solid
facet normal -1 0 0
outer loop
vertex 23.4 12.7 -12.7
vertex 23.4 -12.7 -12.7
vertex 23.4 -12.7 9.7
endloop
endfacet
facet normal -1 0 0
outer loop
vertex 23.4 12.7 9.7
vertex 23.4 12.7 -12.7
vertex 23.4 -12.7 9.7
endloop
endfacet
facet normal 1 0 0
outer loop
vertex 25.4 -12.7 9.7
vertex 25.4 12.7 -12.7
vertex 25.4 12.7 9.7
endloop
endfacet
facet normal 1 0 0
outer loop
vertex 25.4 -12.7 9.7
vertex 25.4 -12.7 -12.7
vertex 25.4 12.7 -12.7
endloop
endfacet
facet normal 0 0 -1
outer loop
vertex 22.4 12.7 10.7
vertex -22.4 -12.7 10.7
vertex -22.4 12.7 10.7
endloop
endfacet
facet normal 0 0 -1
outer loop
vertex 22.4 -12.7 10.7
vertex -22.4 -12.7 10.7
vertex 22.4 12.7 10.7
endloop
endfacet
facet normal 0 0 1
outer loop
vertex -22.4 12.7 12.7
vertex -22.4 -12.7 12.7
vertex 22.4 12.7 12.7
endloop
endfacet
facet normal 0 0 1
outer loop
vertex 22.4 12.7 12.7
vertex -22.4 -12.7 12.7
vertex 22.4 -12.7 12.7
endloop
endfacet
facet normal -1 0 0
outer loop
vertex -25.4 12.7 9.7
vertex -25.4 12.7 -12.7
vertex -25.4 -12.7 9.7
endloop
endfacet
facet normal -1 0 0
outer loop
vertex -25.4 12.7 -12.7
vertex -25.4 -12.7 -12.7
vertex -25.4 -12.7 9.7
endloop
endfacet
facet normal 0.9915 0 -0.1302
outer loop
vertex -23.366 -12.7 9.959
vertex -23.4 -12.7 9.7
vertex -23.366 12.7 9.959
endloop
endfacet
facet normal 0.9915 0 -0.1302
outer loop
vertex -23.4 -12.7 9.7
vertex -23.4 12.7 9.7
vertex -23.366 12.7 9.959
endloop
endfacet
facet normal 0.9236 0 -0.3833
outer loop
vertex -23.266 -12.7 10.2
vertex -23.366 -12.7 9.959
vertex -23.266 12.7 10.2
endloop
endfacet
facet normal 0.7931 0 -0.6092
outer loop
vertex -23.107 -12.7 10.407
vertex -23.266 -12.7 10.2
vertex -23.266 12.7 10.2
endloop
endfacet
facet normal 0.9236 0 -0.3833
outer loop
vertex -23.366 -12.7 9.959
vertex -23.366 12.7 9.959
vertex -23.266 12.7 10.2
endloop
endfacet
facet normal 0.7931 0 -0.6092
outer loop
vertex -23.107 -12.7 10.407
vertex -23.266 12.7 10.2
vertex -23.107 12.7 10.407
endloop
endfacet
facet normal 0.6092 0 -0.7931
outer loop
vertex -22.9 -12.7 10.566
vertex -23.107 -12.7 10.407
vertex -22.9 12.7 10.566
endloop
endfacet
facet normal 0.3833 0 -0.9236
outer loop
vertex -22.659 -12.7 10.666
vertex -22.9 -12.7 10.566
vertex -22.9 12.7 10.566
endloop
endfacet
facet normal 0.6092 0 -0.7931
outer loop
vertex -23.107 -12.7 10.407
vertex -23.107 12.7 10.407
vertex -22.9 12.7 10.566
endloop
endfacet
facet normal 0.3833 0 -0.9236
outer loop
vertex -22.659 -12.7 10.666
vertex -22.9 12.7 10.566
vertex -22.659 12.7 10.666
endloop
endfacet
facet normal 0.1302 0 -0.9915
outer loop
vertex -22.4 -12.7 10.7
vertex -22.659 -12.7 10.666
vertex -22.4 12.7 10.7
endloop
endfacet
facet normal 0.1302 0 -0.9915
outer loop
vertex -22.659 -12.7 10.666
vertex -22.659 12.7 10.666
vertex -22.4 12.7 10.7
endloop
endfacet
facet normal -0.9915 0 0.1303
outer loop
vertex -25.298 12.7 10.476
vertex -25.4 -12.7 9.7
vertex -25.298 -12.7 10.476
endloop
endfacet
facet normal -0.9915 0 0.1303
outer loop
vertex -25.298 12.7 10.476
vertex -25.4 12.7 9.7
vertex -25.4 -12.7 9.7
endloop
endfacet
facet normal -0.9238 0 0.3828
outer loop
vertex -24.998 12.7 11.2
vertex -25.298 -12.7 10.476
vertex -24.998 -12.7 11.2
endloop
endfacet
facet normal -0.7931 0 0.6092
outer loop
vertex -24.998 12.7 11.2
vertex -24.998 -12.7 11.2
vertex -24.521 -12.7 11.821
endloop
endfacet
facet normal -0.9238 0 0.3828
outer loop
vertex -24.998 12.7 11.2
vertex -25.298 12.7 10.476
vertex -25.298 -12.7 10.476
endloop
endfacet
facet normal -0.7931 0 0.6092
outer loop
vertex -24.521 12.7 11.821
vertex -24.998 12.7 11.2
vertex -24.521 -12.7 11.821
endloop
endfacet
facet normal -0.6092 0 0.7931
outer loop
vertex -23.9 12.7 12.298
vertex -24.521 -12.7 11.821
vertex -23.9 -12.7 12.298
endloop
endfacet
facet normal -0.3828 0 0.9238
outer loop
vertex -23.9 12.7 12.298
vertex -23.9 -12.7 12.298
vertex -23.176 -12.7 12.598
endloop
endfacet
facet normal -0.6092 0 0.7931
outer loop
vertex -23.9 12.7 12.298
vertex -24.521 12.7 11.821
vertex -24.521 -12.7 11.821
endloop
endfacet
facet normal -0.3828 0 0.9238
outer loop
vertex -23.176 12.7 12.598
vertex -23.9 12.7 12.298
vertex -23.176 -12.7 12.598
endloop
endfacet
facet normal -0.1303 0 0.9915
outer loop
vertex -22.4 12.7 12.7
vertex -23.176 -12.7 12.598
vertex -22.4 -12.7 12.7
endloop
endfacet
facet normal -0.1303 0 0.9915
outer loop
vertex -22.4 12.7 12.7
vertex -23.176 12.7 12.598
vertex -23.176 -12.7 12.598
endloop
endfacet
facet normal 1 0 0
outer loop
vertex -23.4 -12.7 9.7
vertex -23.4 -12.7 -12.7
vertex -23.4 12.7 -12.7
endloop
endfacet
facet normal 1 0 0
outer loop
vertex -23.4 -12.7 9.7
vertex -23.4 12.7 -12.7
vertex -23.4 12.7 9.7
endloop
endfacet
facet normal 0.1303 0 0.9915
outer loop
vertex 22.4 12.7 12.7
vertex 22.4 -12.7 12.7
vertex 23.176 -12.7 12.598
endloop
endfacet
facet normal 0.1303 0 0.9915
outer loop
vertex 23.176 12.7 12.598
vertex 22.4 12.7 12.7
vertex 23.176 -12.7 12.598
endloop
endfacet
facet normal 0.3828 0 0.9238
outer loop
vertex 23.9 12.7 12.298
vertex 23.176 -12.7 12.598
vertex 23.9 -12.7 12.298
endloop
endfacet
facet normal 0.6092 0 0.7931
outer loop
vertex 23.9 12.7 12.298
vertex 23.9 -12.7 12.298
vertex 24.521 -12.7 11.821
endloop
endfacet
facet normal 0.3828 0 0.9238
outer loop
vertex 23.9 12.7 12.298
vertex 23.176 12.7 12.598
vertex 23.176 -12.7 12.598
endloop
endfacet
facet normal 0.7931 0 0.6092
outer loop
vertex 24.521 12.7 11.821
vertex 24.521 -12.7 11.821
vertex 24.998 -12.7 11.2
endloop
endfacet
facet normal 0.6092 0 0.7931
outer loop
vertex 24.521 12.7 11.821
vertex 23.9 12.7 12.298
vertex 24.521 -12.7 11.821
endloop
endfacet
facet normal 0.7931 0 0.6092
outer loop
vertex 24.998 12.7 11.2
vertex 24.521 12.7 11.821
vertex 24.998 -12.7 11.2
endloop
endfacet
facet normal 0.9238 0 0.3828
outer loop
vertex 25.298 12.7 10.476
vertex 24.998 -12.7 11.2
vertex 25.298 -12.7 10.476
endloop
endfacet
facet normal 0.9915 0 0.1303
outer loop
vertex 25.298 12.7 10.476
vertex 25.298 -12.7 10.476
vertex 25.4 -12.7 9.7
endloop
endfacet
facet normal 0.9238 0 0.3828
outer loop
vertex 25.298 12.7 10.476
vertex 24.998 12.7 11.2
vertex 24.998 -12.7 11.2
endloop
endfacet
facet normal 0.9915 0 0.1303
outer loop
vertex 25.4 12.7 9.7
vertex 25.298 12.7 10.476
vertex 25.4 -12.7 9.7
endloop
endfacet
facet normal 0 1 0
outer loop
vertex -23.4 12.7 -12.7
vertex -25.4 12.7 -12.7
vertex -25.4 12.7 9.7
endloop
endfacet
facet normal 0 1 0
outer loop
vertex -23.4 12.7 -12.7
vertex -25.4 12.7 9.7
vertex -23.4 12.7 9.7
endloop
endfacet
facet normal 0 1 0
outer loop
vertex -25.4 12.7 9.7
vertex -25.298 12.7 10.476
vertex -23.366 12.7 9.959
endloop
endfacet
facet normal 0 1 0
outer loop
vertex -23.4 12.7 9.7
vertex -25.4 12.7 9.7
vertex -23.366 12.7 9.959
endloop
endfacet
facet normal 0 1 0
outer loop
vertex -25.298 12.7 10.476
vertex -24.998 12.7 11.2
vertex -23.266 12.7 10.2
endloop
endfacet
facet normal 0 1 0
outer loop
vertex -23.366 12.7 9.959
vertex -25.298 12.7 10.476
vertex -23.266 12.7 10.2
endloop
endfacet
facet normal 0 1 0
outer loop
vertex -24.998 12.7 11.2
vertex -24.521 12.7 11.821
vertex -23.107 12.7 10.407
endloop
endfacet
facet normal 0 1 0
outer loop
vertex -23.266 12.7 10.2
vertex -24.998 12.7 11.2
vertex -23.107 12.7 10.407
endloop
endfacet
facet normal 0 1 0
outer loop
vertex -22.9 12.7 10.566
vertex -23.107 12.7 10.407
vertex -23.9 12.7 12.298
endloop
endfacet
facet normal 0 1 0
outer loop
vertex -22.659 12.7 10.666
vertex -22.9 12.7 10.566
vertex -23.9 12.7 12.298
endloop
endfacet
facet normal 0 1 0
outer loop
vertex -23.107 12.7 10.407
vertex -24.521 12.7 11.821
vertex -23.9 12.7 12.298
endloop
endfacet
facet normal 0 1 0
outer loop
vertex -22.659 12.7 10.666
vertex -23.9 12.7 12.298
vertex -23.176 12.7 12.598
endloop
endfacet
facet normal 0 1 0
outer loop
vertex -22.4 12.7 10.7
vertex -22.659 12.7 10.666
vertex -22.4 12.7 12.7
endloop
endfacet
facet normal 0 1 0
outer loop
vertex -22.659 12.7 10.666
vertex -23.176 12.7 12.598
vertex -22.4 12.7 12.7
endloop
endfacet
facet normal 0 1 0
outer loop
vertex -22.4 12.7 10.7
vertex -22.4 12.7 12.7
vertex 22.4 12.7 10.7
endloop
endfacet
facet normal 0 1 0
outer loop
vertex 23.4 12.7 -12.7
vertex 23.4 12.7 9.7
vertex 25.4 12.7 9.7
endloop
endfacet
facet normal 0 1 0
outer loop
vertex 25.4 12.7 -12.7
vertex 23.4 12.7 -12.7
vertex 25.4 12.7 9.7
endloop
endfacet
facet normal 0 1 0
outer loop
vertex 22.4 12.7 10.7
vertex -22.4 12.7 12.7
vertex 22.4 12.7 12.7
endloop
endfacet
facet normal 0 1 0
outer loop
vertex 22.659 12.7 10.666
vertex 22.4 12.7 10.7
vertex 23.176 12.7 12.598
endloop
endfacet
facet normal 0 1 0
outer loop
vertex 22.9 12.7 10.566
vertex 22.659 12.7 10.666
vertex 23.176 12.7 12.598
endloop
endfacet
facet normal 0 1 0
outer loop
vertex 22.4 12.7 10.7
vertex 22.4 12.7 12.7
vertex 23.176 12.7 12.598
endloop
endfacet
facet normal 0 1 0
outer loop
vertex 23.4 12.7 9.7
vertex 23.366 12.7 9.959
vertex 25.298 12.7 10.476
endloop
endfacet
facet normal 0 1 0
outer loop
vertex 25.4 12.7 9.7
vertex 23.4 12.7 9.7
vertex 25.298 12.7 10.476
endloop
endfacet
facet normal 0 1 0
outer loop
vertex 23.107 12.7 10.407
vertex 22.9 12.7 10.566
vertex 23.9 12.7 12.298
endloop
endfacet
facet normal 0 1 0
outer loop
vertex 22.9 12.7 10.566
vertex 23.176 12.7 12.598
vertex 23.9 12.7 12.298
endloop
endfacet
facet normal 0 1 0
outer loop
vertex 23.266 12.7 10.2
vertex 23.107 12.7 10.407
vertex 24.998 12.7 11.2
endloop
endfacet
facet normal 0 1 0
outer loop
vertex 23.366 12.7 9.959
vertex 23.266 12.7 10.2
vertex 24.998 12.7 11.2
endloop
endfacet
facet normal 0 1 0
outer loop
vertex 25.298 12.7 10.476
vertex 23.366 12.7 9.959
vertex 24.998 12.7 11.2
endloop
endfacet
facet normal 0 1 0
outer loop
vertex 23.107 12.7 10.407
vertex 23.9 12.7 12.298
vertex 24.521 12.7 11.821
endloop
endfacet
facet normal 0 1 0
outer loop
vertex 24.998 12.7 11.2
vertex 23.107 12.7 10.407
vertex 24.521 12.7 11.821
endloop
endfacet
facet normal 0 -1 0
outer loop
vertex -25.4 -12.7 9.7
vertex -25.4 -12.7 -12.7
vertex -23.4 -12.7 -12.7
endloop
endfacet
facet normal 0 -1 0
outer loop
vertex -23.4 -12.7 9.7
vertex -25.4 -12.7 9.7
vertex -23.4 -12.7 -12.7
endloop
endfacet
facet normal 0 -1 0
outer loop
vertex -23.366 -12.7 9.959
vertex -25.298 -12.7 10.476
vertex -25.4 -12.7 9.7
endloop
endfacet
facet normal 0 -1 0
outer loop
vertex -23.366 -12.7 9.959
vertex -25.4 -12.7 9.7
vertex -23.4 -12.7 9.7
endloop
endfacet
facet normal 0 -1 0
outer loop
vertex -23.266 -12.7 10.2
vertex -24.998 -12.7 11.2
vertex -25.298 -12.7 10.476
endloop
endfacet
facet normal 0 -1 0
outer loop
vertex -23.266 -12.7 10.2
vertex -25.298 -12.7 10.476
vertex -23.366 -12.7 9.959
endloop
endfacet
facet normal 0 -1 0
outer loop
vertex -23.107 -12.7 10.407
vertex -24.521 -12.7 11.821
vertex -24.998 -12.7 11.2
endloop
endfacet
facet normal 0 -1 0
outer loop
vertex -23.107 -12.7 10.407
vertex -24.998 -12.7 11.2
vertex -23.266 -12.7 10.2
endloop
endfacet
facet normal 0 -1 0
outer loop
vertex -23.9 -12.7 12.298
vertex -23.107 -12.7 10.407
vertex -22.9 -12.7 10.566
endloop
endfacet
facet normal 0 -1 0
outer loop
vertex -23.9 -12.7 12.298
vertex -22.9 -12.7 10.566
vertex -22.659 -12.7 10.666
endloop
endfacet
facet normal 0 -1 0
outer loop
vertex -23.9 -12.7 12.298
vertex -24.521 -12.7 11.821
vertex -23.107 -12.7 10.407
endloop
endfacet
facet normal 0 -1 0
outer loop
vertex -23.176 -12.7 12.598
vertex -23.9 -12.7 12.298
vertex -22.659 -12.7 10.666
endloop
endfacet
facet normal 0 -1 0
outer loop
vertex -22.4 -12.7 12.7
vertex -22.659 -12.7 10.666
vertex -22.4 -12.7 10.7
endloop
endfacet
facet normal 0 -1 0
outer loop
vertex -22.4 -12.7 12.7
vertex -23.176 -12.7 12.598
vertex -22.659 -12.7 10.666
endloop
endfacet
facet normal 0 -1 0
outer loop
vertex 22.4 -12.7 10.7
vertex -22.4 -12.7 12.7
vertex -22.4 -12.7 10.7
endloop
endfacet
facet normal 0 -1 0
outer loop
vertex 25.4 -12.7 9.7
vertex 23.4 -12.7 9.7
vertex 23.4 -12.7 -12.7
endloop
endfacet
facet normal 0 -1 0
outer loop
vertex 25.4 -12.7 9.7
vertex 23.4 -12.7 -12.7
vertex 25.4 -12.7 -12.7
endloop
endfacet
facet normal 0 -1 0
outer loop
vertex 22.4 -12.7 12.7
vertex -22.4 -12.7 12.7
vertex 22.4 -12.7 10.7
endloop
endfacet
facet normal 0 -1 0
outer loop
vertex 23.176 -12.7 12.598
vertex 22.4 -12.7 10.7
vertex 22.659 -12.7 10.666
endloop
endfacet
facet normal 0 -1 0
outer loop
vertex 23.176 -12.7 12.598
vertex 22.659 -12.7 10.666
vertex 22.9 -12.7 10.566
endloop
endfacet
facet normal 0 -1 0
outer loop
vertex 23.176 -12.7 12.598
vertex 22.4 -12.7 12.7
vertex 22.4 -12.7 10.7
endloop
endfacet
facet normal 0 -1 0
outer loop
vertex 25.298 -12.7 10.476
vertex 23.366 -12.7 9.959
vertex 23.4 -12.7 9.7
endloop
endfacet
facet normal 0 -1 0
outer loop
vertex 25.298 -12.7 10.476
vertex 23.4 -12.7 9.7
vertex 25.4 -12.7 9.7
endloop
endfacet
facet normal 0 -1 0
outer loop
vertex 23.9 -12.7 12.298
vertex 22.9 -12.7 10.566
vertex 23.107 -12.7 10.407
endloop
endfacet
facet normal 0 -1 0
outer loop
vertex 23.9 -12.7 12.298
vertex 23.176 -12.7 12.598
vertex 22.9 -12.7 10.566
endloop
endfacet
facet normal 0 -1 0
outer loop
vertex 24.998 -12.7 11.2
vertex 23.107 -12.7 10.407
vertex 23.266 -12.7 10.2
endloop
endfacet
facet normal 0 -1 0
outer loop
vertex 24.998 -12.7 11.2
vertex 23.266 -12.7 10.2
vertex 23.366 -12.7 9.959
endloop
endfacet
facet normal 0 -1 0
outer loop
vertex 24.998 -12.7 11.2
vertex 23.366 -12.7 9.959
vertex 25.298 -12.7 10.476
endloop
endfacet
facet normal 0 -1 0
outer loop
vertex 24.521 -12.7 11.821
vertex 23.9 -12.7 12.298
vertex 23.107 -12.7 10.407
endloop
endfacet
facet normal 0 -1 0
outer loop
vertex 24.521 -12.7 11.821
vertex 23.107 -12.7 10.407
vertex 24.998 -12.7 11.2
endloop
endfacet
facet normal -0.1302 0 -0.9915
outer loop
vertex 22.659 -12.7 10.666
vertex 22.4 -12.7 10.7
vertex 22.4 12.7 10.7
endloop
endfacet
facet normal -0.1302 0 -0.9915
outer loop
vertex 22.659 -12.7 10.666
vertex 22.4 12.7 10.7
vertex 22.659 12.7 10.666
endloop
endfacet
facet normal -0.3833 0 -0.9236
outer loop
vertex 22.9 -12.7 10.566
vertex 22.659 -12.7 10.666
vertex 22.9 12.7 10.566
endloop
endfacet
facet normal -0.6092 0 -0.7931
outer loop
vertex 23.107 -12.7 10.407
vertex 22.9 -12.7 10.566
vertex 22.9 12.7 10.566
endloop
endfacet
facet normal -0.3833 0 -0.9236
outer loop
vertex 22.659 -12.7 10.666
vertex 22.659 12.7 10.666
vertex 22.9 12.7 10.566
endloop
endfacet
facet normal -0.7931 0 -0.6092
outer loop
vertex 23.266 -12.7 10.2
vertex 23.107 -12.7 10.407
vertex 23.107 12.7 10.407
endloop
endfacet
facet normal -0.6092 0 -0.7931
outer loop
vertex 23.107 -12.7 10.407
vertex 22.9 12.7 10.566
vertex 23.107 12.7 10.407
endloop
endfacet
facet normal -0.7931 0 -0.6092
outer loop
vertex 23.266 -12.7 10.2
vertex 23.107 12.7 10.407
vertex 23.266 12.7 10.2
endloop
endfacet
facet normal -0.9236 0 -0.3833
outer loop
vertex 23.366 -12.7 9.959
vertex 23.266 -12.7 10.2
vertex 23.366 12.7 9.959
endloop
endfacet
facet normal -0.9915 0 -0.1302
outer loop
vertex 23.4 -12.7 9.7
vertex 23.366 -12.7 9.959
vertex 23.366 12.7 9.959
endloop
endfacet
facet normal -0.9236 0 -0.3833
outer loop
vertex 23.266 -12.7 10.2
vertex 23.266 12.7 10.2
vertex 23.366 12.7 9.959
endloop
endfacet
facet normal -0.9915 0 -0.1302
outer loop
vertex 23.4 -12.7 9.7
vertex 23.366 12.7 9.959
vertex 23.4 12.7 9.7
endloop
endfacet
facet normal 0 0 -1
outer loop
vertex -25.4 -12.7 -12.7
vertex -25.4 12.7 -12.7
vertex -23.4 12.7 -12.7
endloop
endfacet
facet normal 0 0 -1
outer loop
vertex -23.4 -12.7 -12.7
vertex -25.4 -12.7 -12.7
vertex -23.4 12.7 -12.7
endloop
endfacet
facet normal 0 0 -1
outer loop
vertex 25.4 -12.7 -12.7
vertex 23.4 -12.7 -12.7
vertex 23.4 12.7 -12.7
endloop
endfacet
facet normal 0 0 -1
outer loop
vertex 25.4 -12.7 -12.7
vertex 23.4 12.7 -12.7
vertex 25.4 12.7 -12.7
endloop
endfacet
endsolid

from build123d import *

# Parameters (mm, degrees)
F0_W     = 50.8
F0_H     = 25.4
F1_DEPTH = 12.7
F2_W     = 46.8
F2_H     = 23.4
F3_DEPTH = 25.4
F4_R     = 3
F5_R     = 1


with BuildPart() as f1:
    # F0 (on Front) → F1 (new body, symmetric)
    with BuildSketch(Plane.XZ):
        Rectangle(F0_W, F0_H)
    extrude(amount=F1_DEPTH, both=True)

    # F2 (on face) → F3 (cut, through all)
    with BuildSketch(Plane.XZ.offset(12.7)):
        with Locations((0, -1)):
            Rectangle(F2_W, F2_H)
    extrude(amount=-F3_DEPTH, mode=Mode.SUBTRACT)

    # F4
    f4_edges = [f1.edges().sort_by_distance(p)[0] for p in [
        (-25.4, 0, 12.7),
        (25.4, 0, 12.7),
    ]]
    fillet(f4_edges, radius=F4_R)

    # F5
    f5_edges = [f1.edges().sort_by_distance(p)[0] for p in [
        (-23.4, 0, 10.7),
        (23.4, 0, 10.7),
    ]]
    fillet(f5_edges, radius=F5_R)


solid = f1.part
